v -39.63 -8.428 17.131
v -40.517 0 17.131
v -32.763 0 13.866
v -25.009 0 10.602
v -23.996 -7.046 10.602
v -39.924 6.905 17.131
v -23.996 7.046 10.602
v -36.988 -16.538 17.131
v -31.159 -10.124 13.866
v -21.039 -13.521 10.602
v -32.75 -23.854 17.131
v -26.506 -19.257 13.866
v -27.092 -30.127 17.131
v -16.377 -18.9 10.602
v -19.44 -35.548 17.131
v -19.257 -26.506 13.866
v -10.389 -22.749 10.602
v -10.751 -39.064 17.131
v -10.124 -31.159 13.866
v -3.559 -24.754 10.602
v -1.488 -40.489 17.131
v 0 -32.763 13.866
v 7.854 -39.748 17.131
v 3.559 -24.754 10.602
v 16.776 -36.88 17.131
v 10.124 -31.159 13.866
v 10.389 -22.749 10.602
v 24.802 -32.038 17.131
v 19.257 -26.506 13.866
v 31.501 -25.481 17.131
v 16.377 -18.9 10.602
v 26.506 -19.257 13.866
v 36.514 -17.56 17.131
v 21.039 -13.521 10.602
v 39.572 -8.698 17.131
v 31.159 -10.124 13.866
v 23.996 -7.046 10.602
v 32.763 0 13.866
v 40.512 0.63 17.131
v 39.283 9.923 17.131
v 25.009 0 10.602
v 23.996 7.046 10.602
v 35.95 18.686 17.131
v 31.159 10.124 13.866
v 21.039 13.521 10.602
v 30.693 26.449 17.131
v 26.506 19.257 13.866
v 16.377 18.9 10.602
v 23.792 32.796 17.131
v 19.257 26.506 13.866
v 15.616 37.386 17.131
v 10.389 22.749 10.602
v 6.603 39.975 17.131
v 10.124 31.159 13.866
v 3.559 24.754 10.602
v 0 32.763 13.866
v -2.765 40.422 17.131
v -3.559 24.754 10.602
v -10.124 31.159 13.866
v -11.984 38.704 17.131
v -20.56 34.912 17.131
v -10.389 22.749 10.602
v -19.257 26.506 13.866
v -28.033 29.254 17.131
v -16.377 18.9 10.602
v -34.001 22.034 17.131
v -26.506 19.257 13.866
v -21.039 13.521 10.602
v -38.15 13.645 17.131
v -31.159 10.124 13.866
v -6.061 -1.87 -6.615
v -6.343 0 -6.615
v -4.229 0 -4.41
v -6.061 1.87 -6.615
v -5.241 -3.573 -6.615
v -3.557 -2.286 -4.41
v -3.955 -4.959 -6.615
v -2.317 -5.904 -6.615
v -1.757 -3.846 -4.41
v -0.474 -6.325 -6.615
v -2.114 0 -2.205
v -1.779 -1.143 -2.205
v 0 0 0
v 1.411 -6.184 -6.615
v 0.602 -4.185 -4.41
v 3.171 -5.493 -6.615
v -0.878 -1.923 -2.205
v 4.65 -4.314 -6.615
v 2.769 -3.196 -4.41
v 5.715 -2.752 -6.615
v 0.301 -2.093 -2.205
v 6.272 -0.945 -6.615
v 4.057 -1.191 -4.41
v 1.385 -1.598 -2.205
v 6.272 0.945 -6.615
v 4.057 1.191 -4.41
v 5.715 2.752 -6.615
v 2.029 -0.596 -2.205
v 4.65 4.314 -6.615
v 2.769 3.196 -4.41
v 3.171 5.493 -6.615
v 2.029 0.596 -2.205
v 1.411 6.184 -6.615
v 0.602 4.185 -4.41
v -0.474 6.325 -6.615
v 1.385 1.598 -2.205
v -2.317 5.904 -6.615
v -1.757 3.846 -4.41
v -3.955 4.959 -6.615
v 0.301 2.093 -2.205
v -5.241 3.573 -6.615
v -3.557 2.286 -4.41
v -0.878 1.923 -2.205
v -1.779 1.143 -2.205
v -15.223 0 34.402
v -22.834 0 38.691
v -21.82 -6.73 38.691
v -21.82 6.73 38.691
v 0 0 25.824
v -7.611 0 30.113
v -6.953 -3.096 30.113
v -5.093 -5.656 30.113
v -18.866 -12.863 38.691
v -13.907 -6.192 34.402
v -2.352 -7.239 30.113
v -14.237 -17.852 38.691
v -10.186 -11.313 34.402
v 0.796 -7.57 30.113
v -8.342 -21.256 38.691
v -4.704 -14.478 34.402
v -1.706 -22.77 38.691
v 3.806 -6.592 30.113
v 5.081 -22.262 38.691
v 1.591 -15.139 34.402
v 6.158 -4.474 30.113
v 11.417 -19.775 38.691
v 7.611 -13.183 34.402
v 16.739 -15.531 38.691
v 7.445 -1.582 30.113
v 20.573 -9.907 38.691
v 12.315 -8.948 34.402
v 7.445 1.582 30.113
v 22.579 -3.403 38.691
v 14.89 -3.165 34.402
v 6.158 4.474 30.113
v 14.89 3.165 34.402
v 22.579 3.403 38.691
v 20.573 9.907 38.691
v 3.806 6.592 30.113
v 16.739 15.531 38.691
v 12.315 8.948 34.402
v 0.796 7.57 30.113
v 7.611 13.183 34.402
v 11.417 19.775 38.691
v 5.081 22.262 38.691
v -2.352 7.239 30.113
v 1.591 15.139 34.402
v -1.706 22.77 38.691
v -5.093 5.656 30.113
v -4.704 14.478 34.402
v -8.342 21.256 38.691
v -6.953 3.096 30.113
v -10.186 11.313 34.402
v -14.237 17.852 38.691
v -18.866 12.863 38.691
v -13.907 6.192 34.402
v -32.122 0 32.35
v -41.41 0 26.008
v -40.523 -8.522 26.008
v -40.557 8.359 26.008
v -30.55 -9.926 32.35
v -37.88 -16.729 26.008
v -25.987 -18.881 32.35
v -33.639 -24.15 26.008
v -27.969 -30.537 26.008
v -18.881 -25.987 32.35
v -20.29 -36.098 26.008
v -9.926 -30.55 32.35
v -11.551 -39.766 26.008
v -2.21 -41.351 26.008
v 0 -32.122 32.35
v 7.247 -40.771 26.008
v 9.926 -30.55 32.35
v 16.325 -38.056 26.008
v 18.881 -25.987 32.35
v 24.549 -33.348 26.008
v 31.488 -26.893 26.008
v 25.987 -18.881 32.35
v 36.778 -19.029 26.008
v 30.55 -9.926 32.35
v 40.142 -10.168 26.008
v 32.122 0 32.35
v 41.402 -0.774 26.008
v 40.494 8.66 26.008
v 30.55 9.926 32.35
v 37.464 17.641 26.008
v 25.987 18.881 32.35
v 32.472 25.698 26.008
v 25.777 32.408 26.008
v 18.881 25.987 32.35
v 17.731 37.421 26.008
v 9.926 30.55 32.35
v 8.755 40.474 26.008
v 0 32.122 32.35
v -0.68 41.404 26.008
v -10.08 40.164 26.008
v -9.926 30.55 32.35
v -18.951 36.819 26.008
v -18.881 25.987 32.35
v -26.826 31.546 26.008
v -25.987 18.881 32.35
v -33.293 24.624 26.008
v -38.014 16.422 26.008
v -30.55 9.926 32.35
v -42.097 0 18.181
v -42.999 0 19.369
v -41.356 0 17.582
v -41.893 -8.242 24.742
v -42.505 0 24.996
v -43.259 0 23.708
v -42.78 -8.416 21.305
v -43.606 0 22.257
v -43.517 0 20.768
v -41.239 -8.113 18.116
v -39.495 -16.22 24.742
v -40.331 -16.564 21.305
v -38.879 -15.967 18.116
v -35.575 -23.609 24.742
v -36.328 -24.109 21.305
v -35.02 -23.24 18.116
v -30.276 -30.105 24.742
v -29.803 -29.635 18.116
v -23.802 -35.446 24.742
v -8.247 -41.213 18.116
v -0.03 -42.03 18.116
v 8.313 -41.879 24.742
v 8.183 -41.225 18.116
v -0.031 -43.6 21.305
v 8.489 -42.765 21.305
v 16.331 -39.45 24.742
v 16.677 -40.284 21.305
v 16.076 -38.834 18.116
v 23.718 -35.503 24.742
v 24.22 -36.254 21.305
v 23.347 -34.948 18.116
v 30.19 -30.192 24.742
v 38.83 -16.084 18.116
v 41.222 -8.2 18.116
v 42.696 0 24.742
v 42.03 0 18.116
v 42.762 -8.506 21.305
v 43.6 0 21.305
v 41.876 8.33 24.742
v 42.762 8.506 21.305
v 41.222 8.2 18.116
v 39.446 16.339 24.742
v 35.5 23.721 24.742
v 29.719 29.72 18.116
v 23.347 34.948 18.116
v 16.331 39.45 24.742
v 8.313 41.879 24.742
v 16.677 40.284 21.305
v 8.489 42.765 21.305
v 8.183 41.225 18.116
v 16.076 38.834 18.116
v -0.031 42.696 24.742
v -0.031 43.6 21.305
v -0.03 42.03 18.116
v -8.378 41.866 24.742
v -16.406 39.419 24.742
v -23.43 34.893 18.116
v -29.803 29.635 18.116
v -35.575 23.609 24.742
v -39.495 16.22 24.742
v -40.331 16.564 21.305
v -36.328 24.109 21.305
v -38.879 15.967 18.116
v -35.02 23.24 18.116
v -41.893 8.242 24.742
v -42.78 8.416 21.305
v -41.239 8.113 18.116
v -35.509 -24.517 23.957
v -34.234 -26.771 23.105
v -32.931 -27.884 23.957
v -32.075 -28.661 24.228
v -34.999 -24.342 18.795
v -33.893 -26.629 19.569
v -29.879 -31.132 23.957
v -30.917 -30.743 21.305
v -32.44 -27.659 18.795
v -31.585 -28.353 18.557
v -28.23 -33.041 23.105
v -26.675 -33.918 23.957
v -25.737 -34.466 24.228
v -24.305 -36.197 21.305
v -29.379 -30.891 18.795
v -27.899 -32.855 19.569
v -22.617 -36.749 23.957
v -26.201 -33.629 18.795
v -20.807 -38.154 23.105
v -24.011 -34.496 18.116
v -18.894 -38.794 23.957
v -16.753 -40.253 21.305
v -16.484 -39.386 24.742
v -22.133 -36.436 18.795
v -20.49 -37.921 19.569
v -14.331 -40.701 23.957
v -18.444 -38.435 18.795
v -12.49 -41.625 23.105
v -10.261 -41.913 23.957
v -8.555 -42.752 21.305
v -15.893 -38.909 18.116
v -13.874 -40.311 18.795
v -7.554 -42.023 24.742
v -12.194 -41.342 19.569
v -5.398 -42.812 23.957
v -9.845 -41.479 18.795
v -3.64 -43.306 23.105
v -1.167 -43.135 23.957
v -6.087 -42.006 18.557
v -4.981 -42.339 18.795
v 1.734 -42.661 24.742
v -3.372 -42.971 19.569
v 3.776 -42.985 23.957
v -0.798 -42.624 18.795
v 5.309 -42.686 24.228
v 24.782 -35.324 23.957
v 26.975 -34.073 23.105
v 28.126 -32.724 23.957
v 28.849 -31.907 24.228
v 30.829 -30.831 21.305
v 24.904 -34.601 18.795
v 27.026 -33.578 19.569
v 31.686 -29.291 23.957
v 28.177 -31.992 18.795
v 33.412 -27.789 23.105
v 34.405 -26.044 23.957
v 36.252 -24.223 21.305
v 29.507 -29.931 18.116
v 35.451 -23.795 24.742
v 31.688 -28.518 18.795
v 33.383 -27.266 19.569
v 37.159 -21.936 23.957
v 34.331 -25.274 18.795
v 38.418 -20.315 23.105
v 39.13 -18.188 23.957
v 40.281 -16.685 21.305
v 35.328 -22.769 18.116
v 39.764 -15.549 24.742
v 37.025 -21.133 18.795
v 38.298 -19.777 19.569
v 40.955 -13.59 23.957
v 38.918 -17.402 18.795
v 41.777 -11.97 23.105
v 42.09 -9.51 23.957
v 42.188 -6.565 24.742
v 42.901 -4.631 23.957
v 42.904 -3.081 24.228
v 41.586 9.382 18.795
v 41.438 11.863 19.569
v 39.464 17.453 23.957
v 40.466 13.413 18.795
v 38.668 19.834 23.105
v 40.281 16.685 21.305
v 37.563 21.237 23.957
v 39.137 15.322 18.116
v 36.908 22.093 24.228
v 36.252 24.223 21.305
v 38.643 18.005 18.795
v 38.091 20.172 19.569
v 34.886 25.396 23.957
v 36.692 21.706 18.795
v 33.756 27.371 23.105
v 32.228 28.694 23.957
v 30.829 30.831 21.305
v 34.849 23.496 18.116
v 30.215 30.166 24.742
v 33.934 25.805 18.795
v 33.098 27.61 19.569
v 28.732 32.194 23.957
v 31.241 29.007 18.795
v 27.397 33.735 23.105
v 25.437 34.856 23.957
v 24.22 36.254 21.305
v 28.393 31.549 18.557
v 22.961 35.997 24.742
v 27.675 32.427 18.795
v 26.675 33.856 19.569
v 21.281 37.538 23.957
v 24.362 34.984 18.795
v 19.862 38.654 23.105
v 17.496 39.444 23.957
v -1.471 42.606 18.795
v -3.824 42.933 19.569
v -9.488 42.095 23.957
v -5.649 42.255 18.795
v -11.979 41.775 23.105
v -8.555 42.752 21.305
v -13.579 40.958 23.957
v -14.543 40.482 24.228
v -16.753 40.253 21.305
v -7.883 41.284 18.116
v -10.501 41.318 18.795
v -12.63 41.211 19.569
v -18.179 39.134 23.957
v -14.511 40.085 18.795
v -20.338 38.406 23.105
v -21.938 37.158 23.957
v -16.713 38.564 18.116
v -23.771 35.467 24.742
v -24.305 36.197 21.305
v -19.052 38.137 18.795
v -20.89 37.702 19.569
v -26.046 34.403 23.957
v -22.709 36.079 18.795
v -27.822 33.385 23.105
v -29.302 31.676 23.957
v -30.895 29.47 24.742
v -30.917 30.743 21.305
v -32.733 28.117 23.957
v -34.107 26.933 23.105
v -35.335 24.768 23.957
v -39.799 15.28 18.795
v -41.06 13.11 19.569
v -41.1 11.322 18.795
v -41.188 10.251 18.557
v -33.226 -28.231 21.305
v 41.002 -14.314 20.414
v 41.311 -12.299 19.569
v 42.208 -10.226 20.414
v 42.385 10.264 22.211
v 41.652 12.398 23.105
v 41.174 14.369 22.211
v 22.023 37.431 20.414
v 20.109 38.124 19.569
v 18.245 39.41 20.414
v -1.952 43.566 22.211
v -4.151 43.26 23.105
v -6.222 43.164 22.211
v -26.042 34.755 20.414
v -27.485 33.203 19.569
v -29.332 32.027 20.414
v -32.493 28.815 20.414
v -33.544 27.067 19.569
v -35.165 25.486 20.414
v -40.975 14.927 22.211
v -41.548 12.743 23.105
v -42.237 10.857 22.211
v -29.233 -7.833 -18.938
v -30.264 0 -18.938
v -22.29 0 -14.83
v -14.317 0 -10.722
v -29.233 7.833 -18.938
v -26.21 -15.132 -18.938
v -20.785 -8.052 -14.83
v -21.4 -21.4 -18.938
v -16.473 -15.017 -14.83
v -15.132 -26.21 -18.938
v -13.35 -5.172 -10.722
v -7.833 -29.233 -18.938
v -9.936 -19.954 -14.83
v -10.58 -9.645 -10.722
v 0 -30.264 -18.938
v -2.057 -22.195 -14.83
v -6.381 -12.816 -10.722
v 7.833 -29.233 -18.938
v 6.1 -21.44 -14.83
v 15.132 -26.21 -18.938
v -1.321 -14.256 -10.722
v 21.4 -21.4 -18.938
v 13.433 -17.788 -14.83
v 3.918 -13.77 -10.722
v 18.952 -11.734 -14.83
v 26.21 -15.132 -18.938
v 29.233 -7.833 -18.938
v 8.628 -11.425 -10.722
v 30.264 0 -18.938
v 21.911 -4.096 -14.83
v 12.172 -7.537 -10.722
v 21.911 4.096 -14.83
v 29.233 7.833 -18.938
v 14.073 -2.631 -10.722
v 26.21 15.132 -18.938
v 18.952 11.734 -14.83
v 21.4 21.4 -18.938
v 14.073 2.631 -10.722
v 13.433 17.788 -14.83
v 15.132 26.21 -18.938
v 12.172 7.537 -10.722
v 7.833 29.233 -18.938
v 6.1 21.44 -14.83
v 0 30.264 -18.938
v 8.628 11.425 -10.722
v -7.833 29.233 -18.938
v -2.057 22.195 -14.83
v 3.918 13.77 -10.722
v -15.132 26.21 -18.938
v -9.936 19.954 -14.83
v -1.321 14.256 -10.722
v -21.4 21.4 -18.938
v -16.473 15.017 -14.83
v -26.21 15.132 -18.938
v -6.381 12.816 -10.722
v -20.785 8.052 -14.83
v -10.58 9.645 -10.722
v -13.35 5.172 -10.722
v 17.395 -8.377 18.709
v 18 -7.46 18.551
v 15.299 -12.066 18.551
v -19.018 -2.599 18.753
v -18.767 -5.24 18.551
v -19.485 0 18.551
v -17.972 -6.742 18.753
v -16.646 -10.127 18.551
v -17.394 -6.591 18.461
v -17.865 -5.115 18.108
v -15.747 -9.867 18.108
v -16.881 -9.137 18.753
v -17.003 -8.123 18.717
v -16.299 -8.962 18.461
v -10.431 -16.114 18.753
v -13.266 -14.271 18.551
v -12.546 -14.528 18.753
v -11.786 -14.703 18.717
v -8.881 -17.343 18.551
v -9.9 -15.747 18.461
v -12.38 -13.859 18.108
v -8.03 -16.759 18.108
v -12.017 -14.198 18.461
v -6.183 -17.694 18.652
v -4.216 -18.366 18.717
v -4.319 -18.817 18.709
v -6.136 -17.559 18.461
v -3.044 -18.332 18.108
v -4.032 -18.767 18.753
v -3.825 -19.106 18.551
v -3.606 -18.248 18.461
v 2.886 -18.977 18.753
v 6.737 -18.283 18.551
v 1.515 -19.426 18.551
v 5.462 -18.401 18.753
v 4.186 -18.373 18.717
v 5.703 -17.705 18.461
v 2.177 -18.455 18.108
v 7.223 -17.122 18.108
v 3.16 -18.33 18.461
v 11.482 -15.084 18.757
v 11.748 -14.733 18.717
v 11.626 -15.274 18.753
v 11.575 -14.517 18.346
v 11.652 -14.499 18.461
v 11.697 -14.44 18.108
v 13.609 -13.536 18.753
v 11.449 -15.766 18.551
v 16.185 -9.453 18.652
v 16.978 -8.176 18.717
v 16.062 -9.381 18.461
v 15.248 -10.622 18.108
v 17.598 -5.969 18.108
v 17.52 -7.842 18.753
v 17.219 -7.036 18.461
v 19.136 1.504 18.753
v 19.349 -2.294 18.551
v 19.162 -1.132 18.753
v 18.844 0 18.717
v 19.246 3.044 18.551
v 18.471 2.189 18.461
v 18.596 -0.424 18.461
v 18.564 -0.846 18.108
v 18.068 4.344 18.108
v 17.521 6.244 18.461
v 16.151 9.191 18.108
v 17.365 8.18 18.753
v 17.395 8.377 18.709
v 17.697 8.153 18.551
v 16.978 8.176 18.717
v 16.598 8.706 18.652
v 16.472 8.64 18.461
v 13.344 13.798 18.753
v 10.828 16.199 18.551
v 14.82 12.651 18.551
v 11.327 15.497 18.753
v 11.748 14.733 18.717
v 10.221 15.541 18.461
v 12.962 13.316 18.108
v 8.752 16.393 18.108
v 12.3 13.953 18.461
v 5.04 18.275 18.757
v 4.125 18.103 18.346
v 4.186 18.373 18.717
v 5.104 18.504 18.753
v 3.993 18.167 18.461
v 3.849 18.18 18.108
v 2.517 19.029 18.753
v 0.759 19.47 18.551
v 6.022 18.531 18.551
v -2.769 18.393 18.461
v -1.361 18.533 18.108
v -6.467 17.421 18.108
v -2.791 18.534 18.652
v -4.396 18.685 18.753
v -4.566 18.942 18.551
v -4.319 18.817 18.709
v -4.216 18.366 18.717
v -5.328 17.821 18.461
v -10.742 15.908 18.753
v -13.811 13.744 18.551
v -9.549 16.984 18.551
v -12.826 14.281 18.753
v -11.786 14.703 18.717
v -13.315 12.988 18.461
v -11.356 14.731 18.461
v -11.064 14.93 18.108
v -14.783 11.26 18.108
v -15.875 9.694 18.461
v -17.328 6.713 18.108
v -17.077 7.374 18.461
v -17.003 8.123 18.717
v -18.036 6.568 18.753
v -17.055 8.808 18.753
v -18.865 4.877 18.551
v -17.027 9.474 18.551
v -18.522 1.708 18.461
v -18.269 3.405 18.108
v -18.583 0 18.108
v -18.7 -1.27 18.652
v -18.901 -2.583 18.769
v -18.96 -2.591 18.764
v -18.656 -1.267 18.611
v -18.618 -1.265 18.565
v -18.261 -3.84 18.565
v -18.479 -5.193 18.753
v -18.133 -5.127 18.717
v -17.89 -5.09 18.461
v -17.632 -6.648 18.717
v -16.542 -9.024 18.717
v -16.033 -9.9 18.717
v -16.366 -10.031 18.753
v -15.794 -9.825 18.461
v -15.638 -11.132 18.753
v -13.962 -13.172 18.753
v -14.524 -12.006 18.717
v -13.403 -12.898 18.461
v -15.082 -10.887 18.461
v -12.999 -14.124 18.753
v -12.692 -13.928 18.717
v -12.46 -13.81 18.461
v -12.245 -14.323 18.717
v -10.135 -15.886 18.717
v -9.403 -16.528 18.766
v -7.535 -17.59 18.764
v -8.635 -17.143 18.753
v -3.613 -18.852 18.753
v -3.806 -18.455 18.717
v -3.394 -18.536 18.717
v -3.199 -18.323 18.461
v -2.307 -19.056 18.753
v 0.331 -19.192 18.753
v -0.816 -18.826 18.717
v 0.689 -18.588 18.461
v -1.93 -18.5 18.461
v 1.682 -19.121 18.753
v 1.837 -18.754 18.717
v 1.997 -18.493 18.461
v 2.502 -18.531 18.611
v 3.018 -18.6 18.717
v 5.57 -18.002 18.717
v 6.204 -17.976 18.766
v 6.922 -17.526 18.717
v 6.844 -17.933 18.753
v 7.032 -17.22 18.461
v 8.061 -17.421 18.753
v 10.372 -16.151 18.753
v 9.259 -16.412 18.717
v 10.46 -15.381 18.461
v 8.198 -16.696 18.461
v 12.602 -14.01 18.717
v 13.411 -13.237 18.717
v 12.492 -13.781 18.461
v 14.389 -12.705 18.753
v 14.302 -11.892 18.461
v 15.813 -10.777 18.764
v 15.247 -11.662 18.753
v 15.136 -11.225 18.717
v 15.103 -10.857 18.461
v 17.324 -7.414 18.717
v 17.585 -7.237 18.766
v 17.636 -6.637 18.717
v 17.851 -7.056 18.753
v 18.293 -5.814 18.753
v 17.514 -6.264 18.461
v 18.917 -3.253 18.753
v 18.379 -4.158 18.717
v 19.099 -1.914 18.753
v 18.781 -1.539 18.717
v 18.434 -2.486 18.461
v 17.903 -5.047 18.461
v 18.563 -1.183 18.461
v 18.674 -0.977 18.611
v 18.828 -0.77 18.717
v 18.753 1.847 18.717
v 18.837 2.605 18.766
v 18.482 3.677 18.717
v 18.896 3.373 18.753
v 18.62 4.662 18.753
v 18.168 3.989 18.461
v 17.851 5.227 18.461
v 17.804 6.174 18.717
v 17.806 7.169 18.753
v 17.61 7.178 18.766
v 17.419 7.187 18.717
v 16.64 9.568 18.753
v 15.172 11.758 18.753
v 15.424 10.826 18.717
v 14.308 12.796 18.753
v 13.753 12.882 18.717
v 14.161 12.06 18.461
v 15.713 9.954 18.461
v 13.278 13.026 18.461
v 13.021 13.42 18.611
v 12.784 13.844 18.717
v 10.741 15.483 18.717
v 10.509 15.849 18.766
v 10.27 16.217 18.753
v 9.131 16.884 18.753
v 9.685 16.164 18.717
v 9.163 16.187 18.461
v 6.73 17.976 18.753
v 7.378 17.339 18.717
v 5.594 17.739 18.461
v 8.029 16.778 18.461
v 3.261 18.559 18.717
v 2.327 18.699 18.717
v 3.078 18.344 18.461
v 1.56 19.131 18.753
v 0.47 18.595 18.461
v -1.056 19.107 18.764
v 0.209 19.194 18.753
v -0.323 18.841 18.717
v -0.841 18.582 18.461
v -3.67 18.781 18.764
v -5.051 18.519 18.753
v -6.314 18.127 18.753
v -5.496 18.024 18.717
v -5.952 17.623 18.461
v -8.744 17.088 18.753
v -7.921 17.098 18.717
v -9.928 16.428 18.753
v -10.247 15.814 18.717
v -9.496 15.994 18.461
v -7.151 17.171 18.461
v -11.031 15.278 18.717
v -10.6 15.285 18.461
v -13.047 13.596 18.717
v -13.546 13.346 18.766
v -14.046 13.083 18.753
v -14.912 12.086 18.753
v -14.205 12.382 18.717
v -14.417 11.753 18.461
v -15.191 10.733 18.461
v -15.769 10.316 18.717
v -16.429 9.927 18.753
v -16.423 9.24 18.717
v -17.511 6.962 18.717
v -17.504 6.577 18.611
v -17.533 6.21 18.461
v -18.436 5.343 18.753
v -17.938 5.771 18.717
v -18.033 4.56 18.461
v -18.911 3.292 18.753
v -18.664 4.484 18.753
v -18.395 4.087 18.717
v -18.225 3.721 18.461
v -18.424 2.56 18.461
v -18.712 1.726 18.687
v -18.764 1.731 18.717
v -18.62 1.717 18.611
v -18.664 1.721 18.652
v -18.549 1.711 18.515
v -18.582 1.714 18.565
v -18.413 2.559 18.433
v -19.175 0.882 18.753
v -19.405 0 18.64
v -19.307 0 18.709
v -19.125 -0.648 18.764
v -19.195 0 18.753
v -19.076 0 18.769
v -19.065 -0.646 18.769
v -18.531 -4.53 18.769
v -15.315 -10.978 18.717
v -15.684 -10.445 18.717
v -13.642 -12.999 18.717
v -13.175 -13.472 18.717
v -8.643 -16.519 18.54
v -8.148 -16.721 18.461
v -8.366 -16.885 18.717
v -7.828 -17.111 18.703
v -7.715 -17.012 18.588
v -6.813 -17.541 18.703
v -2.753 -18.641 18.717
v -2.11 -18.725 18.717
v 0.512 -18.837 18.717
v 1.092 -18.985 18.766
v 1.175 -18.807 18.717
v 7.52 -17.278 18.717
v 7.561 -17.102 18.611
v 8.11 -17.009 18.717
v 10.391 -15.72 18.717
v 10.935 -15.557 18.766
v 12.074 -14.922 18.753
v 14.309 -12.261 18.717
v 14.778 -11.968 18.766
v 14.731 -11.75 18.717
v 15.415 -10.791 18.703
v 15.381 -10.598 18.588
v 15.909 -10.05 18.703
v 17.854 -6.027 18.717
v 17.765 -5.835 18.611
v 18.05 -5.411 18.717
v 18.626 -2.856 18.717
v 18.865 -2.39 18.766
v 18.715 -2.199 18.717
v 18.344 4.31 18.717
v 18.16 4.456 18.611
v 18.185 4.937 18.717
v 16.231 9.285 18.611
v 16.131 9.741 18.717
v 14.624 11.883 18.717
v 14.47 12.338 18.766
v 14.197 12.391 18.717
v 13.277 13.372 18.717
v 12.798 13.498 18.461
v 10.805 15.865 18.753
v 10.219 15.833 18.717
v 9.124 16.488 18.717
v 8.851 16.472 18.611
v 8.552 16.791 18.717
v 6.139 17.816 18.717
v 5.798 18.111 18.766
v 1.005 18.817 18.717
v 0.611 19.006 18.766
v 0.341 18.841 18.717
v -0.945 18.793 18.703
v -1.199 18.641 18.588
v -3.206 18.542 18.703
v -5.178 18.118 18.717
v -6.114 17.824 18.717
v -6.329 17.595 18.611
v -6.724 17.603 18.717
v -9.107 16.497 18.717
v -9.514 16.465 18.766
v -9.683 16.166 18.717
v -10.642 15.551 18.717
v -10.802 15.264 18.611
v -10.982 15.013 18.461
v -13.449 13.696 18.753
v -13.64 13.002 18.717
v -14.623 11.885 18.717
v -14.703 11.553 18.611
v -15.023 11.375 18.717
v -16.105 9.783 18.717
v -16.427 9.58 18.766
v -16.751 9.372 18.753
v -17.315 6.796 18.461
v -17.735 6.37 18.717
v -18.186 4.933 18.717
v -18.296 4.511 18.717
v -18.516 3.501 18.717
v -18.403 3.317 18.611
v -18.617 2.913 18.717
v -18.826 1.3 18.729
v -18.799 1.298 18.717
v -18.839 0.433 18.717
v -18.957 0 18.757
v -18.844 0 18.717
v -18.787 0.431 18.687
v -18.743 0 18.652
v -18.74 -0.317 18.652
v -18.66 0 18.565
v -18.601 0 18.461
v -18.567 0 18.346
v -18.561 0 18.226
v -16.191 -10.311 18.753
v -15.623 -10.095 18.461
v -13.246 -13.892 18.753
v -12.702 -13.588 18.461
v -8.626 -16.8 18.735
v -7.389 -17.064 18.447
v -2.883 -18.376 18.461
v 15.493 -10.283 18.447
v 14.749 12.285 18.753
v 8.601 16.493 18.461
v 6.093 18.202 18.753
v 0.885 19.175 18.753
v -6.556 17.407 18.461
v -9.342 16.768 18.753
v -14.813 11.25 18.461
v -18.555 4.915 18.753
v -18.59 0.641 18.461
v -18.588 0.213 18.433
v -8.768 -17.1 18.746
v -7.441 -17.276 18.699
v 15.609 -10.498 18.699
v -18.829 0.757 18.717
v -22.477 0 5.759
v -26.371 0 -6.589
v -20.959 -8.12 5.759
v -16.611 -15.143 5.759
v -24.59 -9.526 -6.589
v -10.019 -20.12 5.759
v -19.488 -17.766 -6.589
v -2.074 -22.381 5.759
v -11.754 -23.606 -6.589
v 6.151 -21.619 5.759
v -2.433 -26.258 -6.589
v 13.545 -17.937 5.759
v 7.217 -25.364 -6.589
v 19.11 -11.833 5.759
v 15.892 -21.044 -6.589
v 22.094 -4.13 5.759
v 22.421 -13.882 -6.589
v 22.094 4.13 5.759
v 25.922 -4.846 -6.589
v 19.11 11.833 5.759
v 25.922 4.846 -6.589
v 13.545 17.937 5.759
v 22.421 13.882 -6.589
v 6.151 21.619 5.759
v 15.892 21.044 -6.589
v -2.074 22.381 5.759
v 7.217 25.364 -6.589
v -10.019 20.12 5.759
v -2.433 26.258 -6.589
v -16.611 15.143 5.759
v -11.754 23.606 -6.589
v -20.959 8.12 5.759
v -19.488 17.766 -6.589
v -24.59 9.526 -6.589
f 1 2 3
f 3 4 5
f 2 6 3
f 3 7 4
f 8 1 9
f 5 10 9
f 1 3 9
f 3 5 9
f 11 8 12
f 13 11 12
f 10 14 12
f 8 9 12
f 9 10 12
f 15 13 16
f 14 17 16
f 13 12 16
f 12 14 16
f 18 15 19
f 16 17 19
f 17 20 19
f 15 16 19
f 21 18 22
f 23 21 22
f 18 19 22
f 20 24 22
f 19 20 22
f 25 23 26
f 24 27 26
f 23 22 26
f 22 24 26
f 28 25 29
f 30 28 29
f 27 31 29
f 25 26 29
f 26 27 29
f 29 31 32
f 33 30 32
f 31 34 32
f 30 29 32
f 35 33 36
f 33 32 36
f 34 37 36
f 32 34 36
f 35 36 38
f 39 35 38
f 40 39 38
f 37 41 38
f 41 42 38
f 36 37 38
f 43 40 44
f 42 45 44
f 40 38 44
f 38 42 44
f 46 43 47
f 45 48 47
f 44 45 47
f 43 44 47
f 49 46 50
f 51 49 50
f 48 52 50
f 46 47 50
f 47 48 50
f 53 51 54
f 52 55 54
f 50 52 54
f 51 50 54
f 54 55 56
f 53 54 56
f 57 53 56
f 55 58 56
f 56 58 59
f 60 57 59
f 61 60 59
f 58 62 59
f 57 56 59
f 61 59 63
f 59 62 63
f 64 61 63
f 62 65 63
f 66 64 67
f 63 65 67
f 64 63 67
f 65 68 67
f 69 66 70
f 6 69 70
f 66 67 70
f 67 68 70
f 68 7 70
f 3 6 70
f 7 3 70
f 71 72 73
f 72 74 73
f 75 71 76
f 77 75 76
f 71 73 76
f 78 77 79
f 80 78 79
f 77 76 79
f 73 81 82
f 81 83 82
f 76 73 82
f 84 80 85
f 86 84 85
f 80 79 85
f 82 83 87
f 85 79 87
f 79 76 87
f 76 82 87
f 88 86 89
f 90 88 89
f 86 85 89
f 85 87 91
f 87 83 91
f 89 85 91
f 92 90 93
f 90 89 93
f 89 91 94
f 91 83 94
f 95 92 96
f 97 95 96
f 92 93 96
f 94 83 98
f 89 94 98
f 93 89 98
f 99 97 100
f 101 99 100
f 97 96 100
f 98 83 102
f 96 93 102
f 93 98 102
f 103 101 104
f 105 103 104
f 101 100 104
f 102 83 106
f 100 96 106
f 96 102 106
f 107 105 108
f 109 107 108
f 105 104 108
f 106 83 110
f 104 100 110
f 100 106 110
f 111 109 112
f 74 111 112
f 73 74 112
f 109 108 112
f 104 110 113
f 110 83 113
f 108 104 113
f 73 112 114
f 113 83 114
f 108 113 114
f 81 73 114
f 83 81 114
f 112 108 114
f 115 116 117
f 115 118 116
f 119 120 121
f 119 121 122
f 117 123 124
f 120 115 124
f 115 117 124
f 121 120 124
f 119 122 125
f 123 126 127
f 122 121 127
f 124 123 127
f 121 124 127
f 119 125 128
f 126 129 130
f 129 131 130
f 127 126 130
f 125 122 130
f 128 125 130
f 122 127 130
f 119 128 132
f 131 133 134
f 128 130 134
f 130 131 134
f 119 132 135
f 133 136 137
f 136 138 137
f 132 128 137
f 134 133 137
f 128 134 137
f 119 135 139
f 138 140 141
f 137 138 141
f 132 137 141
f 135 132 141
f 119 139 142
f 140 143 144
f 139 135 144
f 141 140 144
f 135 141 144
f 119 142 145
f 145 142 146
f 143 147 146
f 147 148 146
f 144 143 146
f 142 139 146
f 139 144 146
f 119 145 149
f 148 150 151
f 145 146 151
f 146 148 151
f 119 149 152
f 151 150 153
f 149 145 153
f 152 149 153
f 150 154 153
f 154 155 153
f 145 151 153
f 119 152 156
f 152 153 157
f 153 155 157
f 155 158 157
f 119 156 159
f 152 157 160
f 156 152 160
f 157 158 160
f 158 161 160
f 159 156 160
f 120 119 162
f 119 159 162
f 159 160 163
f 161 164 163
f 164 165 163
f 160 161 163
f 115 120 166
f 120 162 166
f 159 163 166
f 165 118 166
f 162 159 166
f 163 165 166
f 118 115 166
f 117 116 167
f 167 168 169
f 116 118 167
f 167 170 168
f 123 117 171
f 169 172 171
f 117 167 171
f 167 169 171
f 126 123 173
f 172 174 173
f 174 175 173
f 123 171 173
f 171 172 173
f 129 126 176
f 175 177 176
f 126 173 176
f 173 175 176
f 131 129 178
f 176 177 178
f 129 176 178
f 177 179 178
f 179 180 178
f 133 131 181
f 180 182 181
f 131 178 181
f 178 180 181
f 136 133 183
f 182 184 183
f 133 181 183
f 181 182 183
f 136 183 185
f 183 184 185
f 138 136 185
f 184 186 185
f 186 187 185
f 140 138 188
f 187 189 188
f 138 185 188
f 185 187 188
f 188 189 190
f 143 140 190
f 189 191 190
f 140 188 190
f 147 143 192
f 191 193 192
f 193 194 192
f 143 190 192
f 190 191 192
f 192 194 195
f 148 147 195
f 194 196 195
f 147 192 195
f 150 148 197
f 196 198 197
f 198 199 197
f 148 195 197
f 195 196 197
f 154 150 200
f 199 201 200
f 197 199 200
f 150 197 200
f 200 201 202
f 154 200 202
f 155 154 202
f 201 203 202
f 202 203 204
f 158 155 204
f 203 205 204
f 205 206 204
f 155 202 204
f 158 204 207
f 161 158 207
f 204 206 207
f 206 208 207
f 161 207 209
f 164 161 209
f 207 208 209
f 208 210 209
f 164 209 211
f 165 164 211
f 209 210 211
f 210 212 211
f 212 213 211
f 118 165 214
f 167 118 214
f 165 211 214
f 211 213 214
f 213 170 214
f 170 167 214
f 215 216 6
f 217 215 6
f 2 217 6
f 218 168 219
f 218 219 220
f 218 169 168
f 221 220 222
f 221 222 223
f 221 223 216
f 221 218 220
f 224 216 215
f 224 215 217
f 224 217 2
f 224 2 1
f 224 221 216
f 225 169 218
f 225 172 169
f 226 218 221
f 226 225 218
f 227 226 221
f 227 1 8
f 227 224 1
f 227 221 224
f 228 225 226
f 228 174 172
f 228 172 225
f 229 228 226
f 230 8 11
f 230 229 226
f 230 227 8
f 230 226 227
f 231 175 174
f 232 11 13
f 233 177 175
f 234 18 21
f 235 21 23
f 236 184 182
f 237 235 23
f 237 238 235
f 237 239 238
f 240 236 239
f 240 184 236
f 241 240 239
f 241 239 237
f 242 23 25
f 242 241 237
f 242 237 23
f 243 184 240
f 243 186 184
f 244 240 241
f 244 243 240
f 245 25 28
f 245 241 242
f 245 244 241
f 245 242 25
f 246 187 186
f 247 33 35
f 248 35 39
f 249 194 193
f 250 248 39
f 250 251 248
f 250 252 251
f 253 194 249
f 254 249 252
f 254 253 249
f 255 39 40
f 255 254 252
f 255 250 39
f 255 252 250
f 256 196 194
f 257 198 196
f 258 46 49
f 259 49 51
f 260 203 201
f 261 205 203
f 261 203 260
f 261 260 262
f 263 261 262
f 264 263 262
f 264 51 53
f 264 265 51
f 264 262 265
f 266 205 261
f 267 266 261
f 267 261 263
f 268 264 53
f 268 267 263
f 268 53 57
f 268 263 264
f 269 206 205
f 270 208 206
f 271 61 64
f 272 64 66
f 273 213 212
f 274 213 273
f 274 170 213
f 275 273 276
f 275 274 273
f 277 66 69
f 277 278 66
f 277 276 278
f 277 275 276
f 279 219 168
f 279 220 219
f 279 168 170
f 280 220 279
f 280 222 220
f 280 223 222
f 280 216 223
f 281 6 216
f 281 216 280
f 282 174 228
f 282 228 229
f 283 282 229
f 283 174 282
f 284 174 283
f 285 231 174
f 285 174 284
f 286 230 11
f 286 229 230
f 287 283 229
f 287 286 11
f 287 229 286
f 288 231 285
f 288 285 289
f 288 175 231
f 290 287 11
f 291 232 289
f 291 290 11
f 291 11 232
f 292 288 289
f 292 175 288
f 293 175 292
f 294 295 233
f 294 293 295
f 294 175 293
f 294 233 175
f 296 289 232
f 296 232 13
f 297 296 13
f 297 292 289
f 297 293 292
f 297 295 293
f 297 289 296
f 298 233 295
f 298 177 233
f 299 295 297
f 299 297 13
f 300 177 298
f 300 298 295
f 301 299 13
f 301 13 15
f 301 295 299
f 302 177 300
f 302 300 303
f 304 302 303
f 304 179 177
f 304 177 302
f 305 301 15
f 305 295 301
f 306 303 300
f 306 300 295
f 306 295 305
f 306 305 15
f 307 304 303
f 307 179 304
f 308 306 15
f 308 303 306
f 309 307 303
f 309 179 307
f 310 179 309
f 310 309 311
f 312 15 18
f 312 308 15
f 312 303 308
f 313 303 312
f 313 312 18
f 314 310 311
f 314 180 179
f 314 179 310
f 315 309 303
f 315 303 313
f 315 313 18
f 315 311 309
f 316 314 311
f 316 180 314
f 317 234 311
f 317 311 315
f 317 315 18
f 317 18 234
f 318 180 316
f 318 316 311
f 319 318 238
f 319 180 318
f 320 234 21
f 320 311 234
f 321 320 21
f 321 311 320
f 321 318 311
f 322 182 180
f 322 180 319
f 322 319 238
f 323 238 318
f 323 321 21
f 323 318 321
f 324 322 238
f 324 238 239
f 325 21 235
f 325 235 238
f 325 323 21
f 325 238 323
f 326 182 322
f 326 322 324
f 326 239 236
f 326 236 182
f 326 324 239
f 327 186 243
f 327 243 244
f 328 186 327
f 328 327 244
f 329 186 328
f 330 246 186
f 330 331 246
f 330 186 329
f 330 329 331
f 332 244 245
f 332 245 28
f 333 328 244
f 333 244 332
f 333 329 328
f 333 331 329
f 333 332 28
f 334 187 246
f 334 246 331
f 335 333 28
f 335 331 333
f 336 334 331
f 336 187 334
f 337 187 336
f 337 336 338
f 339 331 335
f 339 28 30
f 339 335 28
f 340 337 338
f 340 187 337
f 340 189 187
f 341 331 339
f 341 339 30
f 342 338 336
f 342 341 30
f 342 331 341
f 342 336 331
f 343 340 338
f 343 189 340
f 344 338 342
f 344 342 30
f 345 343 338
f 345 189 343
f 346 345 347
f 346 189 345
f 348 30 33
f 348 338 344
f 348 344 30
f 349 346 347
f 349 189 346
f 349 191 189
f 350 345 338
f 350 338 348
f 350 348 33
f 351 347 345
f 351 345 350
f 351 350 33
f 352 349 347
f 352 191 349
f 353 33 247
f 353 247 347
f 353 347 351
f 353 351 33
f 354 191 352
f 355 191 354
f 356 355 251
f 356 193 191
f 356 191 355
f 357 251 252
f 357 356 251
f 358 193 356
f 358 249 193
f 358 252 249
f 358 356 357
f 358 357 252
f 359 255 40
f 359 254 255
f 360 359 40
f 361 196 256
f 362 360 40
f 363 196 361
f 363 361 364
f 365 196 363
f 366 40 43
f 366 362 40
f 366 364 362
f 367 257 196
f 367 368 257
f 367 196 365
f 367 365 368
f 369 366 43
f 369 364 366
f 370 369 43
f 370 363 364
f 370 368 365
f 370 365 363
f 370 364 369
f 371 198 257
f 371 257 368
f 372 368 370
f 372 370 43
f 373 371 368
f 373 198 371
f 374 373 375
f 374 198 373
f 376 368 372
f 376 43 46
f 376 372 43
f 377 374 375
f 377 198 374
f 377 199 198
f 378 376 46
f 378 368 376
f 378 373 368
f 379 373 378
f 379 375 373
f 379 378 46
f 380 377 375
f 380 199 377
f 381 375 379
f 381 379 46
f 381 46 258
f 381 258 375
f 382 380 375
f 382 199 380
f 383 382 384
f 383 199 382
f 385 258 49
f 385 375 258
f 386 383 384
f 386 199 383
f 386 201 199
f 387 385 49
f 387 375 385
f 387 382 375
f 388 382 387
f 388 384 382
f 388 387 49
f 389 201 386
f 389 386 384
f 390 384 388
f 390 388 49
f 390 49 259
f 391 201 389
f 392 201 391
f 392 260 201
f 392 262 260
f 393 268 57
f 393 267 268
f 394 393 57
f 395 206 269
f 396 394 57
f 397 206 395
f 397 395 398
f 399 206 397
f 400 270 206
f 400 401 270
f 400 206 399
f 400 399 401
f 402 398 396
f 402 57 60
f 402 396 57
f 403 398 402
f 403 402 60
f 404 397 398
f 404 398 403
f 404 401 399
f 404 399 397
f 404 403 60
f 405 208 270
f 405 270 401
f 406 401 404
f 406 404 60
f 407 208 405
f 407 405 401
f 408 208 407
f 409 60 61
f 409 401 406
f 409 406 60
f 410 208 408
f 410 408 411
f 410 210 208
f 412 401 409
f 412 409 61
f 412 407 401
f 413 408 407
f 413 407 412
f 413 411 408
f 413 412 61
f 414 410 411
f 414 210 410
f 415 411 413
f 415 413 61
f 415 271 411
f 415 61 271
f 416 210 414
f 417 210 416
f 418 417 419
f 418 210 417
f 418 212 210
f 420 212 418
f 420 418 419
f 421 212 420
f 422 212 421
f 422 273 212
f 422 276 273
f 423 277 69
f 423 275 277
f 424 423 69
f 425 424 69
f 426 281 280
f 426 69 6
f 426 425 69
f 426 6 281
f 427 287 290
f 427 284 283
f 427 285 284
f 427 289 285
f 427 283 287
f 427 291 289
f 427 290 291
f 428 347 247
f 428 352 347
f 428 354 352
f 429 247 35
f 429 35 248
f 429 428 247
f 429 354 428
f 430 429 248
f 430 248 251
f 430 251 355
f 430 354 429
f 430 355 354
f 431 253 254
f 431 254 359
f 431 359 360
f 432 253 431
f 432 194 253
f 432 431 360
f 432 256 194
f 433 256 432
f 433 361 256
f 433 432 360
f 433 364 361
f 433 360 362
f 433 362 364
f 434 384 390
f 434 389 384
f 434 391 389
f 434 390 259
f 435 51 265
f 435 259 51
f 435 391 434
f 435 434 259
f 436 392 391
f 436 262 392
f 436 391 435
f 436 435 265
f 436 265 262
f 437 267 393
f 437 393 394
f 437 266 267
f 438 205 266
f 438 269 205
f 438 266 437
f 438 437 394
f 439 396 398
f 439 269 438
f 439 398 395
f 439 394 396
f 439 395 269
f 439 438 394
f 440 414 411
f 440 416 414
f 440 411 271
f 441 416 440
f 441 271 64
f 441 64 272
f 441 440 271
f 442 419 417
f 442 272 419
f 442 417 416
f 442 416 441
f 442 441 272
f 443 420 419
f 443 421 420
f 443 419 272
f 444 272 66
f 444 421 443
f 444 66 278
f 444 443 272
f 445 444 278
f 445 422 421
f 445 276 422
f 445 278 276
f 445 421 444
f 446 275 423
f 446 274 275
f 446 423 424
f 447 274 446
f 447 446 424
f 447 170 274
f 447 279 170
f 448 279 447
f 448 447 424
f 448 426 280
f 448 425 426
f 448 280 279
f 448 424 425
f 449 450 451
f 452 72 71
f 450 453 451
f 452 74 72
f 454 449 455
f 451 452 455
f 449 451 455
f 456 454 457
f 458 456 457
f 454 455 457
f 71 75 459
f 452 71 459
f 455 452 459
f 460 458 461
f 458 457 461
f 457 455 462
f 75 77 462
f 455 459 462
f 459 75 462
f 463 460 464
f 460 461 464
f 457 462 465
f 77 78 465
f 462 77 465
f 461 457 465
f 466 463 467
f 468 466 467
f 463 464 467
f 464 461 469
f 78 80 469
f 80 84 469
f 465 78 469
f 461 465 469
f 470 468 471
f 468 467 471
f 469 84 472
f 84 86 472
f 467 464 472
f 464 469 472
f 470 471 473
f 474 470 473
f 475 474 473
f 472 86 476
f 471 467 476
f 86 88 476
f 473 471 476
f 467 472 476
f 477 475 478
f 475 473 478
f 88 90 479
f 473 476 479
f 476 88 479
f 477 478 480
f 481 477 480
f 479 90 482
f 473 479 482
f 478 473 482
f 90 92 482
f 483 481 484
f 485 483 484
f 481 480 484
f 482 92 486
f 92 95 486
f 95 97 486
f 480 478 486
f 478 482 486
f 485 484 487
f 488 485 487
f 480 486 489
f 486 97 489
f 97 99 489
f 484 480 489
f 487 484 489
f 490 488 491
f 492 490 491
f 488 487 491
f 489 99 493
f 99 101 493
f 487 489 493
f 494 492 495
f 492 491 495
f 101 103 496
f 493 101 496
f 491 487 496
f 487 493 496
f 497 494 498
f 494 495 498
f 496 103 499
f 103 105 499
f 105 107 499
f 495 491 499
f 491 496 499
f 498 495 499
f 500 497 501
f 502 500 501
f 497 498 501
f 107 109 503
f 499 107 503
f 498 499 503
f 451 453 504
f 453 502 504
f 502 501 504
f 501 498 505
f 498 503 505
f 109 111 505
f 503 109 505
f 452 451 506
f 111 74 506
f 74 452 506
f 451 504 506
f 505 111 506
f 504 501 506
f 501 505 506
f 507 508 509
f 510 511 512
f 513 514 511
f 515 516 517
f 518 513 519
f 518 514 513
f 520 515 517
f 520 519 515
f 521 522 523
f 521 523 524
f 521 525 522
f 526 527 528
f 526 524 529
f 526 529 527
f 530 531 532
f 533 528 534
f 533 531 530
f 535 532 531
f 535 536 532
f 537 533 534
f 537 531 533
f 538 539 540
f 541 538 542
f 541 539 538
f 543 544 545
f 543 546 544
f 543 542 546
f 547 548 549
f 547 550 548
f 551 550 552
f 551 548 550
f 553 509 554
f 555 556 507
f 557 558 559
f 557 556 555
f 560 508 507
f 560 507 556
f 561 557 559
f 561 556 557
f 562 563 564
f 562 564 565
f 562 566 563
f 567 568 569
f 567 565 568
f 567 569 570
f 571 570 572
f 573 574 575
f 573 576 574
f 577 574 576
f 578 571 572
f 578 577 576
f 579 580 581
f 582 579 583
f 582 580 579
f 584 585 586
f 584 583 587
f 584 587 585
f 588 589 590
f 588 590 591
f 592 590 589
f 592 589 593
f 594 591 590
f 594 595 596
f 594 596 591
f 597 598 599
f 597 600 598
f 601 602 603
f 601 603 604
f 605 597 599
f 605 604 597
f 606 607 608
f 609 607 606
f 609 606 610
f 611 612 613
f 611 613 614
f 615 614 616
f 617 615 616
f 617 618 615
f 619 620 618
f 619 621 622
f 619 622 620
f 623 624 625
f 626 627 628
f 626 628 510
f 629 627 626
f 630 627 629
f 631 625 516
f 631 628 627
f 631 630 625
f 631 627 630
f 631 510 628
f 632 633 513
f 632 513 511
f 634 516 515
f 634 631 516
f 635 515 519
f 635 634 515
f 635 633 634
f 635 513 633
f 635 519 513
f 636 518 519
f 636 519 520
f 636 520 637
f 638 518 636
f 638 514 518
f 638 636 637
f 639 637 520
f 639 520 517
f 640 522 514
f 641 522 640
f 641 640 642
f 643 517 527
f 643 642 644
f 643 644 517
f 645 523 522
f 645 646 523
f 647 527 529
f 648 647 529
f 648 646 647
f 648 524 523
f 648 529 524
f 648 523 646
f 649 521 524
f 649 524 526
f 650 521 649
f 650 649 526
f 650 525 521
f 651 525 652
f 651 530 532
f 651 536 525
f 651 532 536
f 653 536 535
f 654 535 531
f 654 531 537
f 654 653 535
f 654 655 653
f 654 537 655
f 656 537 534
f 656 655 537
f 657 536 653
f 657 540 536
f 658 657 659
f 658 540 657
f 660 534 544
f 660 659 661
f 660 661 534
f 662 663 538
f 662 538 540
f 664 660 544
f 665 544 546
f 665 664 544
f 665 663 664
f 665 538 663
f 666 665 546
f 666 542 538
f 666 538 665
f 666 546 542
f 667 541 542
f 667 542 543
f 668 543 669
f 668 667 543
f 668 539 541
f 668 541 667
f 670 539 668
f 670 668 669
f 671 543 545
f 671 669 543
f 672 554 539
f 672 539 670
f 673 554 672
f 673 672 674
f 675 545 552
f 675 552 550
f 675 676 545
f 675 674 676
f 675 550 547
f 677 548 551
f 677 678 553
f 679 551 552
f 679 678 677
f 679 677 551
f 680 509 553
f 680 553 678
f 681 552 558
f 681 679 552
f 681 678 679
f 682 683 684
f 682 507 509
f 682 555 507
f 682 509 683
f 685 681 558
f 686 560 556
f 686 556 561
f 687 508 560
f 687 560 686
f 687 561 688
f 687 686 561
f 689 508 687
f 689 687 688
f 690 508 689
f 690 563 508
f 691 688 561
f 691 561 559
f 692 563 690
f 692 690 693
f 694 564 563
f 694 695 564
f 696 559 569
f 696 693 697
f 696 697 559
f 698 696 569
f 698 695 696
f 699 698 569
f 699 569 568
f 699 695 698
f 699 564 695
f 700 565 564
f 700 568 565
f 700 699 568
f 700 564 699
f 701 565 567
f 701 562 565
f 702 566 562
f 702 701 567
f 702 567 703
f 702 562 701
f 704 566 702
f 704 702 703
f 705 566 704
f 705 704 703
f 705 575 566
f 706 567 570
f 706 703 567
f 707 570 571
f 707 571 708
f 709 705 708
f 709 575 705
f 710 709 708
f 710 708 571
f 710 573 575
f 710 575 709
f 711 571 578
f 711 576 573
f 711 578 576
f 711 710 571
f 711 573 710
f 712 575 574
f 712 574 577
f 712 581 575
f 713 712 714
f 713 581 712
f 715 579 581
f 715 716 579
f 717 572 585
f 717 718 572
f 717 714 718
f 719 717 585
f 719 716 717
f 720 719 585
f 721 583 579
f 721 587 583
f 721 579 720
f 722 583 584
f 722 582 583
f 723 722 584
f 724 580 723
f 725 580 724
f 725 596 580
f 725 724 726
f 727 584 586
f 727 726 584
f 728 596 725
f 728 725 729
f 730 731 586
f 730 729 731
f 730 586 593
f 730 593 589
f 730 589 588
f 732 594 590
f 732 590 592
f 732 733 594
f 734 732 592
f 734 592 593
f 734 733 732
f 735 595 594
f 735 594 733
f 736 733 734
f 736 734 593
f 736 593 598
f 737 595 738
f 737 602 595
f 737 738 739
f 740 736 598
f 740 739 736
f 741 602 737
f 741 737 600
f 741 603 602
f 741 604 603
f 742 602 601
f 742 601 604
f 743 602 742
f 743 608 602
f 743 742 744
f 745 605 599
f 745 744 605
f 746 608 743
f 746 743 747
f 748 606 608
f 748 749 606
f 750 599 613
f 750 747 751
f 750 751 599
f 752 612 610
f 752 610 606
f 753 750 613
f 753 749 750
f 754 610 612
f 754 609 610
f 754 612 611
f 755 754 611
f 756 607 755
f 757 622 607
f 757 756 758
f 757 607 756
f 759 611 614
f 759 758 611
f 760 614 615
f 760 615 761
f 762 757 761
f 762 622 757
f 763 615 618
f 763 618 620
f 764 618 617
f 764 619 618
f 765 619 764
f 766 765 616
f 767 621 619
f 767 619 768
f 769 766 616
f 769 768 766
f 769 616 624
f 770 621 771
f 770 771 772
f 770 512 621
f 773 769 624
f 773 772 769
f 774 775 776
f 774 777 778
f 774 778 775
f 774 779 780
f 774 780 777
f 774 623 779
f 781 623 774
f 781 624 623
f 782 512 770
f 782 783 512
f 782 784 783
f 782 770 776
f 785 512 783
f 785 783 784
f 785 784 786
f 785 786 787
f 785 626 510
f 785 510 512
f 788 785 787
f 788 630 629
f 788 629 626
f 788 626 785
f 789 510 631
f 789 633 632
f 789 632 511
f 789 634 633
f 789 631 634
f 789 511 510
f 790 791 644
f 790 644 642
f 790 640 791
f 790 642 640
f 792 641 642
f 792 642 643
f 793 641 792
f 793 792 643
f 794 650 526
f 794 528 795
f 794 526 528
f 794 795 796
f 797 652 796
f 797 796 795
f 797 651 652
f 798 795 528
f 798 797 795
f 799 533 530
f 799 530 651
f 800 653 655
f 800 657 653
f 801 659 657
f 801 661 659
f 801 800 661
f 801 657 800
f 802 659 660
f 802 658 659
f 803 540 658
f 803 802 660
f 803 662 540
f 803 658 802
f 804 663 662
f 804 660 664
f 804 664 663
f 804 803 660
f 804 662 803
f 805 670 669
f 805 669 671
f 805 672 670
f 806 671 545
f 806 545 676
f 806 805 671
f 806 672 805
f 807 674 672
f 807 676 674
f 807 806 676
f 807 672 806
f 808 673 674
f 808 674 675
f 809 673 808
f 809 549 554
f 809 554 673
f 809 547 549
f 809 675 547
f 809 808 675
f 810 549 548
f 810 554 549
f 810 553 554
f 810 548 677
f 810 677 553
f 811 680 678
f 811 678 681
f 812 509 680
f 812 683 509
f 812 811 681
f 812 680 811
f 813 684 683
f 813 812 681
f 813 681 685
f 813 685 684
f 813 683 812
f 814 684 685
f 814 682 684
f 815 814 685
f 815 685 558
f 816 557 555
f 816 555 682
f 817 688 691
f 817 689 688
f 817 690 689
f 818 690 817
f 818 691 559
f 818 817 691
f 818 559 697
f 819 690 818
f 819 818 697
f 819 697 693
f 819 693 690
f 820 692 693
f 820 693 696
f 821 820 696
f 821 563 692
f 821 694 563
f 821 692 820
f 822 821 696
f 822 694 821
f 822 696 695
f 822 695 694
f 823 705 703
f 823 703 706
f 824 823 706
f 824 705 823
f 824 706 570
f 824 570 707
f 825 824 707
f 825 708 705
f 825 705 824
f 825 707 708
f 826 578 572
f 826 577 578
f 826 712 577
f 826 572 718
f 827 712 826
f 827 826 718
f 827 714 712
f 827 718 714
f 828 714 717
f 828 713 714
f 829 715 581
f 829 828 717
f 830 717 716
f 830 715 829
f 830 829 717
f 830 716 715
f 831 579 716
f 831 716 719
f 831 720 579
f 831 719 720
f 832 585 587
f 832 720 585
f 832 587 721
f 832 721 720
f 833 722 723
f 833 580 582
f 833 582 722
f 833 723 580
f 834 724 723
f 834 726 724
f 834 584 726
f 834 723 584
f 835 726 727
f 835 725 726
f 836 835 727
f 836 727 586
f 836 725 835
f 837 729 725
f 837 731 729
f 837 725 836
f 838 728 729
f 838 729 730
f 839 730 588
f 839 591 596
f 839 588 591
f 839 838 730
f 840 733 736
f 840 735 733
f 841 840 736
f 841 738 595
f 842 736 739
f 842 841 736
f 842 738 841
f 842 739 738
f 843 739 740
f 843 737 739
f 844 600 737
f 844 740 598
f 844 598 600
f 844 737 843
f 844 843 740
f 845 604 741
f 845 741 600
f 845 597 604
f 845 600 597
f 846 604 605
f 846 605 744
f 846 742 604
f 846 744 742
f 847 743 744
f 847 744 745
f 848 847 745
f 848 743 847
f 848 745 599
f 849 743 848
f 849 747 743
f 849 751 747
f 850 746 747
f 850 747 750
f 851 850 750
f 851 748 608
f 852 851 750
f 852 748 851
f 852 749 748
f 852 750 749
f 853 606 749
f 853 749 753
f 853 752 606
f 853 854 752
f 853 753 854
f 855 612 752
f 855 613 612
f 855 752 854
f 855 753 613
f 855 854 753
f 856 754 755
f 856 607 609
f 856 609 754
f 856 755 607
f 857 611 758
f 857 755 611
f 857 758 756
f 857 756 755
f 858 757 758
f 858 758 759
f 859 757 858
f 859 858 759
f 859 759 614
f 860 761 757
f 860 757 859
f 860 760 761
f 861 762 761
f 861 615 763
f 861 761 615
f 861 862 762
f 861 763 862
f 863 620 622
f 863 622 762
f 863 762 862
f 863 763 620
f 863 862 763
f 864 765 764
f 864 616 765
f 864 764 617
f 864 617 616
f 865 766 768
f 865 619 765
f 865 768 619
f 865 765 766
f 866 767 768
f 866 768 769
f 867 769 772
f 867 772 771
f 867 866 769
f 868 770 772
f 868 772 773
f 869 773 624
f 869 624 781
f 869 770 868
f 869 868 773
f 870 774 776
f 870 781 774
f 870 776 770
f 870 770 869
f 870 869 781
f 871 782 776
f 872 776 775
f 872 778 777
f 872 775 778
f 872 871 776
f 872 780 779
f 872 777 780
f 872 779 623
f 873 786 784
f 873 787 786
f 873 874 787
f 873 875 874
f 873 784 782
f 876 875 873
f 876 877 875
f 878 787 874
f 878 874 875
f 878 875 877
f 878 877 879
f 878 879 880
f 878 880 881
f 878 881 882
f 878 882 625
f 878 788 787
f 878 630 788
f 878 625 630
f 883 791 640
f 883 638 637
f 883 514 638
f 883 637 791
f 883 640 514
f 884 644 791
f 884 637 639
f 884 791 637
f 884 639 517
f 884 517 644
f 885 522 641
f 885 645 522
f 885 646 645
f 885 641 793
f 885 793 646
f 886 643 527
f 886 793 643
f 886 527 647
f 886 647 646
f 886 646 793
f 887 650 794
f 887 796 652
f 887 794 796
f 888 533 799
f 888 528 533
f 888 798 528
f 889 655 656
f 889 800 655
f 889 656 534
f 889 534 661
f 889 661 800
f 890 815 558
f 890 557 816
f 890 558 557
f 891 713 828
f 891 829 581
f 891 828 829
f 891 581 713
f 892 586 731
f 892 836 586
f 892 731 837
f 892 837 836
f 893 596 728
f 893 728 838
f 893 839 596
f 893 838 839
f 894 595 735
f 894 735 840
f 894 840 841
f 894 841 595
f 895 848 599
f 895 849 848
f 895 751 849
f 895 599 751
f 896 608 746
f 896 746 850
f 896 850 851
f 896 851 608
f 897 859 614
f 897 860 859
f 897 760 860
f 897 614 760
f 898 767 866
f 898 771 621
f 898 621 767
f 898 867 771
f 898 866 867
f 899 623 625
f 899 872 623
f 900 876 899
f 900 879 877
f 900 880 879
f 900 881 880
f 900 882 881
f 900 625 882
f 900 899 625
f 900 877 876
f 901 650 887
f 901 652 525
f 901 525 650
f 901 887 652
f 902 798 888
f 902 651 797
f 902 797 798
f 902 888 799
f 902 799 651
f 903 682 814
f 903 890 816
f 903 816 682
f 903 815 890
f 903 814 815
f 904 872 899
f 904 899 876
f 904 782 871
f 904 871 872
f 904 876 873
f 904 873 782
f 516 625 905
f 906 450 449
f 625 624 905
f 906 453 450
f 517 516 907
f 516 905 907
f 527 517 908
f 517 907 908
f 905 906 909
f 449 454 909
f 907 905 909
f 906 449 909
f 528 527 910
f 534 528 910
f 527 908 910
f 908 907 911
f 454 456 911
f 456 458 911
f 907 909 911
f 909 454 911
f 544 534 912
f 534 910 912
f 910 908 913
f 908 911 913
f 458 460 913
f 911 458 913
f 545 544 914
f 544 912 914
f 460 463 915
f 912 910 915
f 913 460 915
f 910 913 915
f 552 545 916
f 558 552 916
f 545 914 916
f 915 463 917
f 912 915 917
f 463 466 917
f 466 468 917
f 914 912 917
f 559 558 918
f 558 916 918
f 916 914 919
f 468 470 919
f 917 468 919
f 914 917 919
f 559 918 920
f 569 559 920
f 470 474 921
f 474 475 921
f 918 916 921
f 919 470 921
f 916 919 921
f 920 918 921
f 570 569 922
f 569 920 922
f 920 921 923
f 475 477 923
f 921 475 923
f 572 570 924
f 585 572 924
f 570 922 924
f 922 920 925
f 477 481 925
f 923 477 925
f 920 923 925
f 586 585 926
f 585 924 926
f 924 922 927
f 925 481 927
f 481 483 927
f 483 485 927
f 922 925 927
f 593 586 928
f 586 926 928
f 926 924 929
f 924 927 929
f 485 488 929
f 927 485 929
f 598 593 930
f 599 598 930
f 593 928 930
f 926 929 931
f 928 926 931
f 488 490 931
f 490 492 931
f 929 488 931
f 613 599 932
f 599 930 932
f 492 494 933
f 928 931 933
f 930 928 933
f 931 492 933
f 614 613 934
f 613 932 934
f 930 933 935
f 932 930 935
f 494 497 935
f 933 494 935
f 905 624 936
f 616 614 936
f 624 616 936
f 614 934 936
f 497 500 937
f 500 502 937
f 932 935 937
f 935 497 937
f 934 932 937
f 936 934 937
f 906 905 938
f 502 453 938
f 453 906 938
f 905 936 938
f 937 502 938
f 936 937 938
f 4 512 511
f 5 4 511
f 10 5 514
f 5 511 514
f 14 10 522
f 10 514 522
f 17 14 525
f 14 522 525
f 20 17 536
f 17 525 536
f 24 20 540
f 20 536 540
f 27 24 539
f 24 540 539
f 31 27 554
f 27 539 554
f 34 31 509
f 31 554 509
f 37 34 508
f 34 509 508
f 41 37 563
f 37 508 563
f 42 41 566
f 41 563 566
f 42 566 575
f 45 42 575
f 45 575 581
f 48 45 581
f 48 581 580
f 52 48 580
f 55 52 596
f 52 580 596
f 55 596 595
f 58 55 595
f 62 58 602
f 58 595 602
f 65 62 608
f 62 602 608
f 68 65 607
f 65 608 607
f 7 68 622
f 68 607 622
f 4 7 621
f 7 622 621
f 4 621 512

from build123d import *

# Parameters (mm, degrees)
F2_R = 5.08
F3_R = 0.508


with BuildPart() as f1:
    # F0 (on Front) → F1 (revolve)
    with BuildSketch(Plane.XZ):
        Polygon((-6.342808, -6.614644), (0, 0), (0, 25.824292), (-22.834111, 38.691133), (-49.111459, 20.750046), (-25.008788, 10.601551), (-17.578641, 21.293715), (-30.264258, -18.937815), align=None)
    revolve(axis=Axis((0, 0, 51.104914), (0, 0, 1)))

    # F2
    f2_edges = [f1.edges().sort_by_distance(p)[0] for p in [
        (49.111459, 0, 20.750046),
    ]]
    fillet(f2_edges, radius=F2_R)

    # F3
    f3_edges = [f1.edges().sort_by_distance(p)[0] for p in [
        (17.578641, 0, 21.293715),
    ]]
    fillet(f3_edges, radius=F3_R)


solid = f1.part
